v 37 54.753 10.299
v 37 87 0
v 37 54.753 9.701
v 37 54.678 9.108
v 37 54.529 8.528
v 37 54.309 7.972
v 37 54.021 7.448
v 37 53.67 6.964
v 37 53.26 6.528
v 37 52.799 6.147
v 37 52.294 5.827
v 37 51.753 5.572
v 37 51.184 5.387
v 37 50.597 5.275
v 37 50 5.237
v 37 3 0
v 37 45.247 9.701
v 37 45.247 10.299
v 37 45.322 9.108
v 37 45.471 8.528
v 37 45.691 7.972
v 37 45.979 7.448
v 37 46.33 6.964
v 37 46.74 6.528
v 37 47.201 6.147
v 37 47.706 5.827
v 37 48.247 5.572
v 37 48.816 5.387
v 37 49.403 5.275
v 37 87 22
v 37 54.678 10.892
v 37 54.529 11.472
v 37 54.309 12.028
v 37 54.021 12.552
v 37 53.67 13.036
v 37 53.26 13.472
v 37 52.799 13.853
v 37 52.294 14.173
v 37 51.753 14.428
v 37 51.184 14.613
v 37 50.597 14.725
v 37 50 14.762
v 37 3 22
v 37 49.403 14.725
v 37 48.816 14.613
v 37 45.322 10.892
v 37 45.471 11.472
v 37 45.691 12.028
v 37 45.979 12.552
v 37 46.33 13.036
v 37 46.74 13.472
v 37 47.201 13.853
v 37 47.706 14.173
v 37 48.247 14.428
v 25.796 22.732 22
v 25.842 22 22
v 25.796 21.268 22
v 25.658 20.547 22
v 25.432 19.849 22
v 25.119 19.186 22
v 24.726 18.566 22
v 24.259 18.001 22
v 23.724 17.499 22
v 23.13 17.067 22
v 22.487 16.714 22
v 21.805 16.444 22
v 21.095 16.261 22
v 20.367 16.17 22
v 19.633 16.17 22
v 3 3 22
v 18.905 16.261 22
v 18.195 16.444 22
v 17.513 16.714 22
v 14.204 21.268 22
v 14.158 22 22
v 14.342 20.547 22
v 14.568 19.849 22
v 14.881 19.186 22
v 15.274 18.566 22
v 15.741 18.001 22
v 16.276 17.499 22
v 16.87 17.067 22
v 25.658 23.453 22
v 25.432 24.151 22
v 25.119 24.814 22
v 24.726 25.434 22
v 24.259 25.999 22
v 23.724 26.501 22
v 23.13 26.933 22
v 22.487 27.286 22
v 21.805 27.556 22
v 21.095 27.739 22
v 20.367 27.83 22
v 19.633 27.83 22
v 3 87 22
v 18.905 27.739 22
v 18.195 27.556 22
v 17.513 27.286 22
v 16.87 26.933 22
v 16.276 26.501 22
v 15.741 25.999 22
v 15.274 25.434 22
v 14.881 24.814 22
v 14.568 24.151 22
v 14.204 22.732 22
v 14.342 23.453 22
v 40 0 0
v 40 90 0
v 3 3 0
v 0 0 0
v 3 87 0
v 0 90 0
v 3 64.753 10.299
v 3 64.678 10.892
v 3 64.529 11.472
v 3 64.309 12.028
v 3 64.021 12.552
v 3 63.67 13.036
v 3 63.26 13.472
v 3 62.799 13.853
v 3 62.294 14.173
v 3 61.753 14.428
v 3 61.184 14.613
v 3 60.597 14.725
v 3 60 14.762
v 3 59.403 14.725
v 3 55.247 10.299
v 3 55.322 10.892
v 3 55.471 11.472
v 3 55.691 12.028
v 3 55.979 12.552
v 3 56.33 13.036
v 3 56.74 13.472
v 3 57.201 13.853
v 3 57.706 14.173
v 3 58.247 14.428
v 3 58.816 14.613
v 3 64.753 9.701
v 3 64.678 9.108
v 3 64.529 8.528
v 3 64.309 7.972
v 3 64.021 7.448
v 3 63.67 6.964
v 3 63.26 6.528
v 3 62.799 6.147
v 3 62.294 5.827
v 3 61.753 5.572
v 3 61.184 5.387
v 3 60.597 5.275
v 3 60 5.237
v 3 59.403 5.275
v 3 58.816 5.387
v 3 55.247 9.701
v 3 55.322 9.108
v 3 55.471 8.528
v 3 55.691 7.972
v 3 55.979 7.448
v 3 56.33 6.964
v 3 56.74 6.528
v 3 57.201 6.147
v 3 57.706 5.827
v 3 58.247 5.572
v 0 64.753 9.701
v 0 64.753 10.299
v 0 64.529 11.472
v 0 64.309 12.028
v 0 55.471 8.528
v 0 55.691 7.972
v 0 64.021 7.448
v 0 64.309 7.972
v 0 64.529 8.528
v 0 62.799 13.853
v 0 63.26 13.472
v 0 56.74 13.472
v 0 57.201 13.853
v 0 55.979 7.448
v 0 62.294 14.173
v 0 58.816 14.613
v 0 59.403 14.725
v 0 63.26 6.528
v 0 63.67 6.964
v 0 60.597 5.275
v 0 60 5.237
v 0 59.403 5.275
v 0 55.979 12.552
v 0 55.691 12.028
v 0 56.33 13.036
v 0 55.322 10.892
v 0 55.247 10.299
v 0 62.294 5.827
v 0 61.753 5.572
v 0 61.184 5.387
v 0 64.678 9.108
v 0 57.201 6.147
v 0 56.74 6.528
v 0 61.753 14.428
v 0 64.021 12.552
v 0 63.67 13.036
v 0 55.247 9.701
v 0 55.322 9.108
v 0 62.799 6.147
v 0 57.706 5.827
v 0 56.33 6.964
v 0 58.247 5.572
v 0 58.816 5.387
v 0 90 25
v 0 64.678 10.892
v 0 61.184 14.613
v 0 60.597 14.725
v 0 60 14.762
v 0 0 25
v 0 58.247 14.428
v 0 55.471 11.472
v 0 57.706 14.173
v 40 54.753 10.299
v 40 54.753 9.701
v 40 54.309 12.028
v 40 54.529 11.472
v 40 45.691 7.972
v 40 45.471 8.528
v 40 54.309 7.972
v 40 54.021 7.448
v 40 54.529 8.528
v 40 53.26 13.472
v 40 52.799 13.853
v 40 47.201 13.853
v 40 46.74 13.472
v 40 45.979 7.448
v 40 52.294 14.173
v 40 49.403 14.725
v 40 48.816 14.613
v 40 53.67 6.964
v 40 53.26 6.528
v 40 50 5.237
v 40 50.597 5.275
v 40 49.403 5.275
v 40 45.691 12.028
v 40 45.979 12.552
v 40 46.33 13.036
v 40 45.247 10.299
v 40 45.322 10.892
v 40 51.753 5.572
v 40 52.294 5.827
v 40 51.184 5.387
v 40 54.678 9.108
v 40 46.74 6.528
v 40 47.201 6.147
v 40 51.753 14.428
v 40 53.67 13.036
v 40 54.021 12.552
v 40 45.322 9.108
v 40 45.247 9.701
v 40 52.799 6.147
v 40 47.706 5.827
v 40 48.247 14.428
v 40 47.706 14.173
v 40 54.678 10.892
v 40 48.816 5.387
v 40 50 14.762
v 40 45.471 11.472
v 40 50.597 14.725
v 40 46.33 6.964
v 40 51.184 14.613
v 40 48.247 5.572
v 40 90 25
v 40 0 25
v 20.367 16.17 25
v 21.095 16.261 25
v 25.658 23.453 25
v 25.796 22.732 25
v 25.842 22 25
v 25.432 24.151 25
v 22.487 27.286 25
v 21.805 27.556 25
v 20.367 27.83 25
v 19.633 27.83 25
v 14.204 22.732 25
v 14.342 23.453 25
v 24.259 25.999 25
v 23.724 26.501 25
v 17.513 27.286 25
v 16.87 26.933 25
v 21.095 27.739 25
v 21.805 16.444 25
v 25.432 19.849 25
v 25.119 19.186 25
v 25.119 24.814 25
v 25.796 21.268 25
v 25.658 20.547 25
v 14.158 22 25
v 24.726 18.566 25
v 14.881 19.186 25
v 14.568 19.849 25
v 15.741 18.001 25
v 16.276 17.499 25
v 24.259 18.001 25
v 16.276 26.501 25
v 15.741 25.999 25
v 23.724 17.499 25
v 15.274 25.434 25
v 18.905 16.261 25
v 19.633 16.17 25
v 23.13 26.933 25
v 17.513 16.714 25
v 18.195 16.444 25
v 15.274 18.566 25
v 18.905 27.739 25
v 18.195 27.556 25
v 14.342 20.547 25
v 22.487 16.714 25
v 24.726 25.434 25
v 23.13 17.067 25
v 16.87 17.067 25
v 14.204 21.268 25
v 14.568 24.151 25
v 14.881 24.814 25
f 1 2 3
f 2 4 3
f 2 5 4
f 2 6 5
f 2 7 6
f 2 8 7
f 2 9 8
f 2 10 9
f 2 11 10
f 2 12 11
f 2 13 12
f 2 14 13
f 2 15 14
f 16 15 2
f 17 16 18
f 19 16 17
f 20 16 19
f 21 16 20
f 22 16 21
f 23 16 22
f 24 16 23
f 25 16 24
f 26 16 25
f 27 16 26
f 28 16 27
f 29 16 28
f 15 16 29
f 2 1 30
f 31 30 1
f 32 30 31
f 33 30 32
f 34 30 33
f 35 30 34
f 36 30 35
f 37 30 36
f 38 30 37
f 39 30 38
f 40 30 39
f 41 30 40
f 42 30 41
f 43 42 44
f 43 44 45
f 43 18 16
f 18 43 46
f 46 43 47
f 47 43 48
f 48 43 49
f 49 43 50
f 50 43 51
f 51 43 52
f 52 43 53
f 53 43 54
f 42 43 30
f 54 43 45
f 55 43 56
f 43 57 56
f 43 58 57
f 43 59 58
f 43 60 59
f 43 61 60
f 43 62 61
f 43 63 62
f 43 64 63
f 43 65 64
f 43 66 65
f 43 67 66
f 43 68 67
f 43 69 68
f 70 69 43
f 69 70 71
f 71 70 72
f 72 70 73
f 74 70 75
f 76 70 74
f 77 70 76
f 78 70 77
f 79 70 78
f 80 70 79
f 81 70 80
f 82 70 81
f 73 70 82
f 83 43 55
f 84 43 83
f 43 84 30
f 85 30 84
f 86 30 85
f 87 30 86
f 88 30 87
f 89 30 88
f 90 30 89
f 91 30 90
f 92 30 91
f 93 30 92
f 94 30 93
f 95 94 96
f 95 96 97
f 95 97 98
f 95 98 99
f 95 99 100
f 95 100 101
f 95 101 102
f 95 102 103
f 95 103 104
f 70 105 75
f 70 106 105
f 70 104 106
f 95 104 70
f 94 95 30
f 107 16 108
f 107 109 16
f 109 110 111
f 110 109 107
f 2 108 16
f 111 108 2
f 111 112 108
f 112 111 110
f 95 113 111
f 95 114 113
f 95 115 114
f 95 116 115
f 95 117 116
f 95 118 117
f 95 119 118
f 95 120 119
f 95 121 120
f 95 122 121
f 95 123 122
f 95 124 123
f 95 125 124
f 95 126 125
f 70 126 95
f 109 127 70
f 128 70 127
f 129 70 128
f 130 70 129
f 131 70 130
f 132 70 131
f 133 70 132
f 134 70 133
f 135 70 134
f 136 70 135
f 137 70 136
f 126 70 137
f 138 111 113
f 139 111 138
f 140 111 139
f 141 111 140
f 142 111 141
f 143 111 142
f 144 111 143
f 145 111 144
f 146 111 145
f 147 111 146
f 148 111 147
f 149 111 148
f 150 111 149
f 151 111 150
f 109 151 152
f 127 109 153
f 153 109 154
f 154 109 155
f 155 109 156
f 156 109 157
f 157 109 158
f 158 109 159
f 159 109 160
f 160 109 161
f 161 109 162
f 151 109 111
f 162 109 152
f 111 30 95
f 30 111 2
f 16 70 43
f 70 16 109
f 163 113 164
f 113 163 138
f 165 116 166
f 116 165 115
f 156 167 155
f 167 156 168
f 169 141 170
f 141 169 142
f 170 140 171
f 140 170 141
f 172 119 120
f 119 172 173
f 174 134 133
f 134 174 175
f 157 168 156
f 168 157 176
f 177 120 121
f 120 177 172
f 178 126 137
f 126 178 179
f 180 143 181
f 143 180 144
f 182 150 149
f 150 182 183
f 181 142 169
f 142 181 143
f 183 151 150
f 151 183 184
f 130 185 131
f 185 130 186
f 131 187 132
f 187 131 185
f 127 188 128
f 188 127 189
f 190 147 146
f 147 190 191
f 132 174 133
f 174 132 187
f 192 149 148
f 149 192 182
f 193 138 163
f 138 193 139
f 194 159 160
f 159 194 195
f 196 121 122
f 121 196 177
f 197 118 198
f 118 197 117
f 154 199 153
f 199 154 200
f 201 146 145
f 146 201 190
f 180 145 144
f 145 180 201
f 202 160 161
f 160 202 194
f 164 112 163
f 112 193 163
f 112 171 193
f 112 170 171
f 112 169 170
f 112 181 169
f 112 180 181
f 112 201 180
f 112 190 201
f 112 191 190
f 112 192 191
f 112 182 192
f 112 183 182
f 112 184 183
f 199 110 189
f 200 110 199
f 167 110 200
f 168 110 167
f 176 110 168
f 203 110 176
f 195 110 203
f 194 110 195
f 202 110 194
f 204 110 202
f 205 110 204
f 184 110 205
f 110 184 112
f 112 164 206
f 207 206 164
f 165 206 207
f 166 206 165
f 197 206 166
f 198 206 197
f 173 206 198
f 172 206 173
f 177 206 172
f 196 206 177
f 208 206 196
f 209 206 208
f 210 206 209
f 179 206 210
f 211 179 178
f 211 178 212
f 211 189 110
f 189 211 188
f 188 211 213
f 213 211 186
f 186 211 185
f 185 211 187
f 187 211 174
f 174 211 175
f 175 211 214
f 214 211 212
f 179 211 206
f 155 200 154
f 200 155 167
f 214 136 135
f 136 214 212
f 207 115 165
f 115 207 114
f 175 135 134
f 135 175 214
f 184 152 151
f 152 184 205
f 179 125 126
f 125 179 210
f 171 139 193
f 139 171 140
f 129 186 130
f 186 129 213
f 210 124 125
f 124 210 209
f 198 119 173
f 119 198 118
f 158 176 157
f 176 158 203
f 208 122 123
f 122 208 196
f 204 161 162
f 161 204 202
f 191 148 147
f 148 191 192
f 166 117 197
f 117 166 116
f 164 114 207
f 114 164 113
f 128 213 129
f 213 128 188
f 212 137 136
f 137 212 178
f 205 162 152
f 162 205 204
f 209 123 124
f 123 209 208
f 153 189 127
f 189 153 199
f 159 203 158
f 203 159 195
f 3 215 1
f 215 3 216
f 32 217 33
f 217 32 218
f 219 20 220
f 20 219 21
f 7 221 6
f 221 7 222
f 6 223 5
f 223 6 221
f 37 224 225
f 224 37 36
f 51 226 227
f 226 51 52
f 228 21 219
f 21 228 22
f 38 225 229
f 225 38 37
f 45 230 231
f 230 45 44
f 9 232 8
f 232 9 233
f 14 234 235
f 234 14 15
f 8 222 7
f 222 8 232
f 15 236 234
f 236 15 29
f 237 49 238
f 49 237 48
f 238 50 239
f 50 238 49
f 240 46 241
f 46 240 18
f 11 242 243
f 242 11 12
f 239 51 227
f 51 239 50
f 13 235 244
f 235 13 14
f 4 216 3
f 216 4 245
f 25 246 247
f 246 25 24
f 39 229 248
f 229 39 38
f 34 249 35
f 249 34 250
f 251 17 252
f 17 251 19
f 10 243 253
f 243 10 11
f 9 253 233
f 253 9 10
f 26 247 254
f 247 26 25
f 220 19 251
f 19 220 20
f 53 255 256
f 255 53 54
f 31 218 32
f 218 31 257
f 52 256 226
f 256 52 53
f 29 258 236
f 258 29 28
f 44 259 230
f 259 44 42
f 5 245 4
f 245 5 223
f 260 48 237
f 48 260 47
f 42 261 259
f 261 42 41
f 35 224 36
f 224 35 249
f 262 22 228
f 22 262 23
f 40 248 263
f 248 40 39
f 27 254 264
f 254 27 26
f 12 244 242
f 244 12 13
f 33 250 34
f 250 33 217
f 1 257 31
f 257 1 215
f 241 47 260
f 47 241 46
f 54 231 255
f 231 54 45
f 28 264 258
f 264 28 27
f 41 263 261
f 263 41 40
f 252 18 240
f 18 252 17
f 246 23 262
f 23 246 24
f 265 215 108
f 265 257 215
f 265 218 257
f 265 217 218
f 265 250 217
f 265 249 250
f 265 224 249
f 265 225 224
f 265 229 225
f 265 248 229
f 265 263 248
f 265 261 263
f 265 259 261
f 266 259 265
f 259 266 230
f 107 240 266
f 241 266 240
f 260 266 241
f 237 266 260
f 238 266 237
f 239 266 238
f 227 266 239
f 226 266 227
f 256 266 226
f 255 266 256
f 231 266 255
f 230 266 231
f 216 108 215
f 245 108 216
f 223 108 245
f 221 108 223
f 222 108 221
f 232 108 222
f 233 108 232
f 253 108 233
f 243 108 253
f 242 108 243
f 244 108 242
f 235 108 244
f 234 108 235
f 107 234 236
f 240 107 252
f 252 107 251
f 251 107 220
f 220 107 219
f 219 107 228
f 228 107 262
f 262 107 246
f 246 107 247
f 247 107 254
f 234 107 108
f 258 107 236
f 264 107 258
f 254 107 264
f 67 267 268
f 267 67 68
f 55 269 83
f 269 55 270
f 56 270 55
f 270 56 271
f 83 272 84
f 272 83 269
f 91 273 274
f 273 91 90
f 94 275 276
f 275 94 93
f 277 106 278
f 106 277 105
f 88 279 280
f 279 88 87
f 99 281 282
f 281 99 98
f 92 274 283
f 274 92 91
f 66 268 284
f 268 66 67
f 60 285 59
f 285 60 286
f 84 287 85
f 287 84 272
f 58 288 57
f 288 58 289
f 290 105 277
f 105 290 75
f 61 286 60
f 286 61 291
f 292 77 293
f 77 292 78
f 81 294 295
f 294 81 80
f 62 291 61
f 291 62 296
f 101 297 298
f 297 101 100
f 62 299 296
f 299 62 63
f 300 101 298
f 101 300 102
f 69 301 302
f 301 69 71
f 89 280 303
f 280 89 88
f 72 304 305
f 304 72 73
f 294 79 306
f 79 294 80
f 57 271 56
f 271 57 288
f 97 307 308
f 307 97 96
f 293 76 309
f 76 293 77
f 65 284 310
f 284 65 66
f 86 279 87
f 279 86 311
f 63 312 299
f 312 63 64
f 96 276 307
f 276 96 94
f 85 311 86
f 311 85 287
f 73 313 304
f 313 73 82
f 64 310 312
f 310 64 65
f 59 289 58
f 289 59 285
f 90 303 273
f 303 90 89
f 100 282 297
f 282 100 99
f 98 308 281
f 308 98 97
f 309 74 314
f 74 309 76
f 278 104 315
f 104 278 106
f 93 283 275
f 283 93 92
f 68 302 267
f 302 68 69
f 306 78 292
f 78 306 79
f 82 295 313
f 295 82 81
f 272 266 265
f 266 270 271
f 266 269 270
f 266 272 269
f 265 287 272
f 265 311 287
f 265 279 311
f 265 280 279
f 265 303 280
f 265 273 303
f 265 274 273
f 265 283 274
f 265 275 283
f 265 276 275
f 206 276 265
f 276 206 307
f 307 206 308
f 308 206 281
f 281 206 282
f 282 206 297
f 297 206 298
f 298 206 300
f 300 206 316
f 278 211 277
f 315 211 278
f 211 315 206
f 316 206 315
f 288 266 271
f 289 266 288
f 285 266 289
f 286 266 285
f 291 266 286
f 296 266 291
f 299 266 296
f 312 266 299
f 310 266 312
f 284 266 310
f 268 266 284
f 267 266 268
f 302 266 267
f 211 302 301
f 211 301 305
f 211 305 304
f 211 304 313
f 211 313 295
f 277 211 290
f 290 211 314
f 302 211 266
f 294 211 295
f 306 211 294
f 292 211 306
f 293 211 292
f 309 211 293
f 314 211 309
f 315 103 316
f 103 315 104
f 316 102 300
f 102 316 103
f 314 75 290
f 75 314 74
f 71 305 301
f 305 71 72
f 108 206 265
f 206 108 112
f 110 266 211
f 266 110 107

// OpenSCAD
cylinder_res = 50;
tol = .2;

footswitch_radius = .46 * 25.4;
jack_radius = 9.525;

width = 40;
length = 90;
height = 25;
shell_thickness = 3;

jack_height = 10;
jack_pos1 = 60;
jack_pos2 = jack_pos1 - 10;

footswitch_pos = 22;

pedal();



module pedal() {
difference() {

//the outside of the pedal
cube([width, length, height]);

union() {
	//cut out the inside of the pedal
	translate([shell_thickness, shell_thickness, 0])
		cube([width - shell_thickness * 2, length - shell_thickness * 2, height - shell_thickness]);
	
	//left and right jacks
	translate([0, jack_pos1, jack_height])
	rotate([0, 90, 0])
	cylinder(shell_thickness, jack_radius / 2, jack_radius / 2, $fn=cylinder_res);

	translate([width - shell_thickness, jack_pos2, jack_height])
	rotate([0, 90, 0])
	cylinder(shell_thickness, jack_radius / 2, jack_radius / 2, $fn=cylinder_res);
	
	//footswitch
	translate([width / 2, footswitch_pos, height - shell_thickness])
	cylinder(shell_thickness, footswitch_radius / 2, footswitch_radius / 2, $fn=cylinder_res);

}
}
}
